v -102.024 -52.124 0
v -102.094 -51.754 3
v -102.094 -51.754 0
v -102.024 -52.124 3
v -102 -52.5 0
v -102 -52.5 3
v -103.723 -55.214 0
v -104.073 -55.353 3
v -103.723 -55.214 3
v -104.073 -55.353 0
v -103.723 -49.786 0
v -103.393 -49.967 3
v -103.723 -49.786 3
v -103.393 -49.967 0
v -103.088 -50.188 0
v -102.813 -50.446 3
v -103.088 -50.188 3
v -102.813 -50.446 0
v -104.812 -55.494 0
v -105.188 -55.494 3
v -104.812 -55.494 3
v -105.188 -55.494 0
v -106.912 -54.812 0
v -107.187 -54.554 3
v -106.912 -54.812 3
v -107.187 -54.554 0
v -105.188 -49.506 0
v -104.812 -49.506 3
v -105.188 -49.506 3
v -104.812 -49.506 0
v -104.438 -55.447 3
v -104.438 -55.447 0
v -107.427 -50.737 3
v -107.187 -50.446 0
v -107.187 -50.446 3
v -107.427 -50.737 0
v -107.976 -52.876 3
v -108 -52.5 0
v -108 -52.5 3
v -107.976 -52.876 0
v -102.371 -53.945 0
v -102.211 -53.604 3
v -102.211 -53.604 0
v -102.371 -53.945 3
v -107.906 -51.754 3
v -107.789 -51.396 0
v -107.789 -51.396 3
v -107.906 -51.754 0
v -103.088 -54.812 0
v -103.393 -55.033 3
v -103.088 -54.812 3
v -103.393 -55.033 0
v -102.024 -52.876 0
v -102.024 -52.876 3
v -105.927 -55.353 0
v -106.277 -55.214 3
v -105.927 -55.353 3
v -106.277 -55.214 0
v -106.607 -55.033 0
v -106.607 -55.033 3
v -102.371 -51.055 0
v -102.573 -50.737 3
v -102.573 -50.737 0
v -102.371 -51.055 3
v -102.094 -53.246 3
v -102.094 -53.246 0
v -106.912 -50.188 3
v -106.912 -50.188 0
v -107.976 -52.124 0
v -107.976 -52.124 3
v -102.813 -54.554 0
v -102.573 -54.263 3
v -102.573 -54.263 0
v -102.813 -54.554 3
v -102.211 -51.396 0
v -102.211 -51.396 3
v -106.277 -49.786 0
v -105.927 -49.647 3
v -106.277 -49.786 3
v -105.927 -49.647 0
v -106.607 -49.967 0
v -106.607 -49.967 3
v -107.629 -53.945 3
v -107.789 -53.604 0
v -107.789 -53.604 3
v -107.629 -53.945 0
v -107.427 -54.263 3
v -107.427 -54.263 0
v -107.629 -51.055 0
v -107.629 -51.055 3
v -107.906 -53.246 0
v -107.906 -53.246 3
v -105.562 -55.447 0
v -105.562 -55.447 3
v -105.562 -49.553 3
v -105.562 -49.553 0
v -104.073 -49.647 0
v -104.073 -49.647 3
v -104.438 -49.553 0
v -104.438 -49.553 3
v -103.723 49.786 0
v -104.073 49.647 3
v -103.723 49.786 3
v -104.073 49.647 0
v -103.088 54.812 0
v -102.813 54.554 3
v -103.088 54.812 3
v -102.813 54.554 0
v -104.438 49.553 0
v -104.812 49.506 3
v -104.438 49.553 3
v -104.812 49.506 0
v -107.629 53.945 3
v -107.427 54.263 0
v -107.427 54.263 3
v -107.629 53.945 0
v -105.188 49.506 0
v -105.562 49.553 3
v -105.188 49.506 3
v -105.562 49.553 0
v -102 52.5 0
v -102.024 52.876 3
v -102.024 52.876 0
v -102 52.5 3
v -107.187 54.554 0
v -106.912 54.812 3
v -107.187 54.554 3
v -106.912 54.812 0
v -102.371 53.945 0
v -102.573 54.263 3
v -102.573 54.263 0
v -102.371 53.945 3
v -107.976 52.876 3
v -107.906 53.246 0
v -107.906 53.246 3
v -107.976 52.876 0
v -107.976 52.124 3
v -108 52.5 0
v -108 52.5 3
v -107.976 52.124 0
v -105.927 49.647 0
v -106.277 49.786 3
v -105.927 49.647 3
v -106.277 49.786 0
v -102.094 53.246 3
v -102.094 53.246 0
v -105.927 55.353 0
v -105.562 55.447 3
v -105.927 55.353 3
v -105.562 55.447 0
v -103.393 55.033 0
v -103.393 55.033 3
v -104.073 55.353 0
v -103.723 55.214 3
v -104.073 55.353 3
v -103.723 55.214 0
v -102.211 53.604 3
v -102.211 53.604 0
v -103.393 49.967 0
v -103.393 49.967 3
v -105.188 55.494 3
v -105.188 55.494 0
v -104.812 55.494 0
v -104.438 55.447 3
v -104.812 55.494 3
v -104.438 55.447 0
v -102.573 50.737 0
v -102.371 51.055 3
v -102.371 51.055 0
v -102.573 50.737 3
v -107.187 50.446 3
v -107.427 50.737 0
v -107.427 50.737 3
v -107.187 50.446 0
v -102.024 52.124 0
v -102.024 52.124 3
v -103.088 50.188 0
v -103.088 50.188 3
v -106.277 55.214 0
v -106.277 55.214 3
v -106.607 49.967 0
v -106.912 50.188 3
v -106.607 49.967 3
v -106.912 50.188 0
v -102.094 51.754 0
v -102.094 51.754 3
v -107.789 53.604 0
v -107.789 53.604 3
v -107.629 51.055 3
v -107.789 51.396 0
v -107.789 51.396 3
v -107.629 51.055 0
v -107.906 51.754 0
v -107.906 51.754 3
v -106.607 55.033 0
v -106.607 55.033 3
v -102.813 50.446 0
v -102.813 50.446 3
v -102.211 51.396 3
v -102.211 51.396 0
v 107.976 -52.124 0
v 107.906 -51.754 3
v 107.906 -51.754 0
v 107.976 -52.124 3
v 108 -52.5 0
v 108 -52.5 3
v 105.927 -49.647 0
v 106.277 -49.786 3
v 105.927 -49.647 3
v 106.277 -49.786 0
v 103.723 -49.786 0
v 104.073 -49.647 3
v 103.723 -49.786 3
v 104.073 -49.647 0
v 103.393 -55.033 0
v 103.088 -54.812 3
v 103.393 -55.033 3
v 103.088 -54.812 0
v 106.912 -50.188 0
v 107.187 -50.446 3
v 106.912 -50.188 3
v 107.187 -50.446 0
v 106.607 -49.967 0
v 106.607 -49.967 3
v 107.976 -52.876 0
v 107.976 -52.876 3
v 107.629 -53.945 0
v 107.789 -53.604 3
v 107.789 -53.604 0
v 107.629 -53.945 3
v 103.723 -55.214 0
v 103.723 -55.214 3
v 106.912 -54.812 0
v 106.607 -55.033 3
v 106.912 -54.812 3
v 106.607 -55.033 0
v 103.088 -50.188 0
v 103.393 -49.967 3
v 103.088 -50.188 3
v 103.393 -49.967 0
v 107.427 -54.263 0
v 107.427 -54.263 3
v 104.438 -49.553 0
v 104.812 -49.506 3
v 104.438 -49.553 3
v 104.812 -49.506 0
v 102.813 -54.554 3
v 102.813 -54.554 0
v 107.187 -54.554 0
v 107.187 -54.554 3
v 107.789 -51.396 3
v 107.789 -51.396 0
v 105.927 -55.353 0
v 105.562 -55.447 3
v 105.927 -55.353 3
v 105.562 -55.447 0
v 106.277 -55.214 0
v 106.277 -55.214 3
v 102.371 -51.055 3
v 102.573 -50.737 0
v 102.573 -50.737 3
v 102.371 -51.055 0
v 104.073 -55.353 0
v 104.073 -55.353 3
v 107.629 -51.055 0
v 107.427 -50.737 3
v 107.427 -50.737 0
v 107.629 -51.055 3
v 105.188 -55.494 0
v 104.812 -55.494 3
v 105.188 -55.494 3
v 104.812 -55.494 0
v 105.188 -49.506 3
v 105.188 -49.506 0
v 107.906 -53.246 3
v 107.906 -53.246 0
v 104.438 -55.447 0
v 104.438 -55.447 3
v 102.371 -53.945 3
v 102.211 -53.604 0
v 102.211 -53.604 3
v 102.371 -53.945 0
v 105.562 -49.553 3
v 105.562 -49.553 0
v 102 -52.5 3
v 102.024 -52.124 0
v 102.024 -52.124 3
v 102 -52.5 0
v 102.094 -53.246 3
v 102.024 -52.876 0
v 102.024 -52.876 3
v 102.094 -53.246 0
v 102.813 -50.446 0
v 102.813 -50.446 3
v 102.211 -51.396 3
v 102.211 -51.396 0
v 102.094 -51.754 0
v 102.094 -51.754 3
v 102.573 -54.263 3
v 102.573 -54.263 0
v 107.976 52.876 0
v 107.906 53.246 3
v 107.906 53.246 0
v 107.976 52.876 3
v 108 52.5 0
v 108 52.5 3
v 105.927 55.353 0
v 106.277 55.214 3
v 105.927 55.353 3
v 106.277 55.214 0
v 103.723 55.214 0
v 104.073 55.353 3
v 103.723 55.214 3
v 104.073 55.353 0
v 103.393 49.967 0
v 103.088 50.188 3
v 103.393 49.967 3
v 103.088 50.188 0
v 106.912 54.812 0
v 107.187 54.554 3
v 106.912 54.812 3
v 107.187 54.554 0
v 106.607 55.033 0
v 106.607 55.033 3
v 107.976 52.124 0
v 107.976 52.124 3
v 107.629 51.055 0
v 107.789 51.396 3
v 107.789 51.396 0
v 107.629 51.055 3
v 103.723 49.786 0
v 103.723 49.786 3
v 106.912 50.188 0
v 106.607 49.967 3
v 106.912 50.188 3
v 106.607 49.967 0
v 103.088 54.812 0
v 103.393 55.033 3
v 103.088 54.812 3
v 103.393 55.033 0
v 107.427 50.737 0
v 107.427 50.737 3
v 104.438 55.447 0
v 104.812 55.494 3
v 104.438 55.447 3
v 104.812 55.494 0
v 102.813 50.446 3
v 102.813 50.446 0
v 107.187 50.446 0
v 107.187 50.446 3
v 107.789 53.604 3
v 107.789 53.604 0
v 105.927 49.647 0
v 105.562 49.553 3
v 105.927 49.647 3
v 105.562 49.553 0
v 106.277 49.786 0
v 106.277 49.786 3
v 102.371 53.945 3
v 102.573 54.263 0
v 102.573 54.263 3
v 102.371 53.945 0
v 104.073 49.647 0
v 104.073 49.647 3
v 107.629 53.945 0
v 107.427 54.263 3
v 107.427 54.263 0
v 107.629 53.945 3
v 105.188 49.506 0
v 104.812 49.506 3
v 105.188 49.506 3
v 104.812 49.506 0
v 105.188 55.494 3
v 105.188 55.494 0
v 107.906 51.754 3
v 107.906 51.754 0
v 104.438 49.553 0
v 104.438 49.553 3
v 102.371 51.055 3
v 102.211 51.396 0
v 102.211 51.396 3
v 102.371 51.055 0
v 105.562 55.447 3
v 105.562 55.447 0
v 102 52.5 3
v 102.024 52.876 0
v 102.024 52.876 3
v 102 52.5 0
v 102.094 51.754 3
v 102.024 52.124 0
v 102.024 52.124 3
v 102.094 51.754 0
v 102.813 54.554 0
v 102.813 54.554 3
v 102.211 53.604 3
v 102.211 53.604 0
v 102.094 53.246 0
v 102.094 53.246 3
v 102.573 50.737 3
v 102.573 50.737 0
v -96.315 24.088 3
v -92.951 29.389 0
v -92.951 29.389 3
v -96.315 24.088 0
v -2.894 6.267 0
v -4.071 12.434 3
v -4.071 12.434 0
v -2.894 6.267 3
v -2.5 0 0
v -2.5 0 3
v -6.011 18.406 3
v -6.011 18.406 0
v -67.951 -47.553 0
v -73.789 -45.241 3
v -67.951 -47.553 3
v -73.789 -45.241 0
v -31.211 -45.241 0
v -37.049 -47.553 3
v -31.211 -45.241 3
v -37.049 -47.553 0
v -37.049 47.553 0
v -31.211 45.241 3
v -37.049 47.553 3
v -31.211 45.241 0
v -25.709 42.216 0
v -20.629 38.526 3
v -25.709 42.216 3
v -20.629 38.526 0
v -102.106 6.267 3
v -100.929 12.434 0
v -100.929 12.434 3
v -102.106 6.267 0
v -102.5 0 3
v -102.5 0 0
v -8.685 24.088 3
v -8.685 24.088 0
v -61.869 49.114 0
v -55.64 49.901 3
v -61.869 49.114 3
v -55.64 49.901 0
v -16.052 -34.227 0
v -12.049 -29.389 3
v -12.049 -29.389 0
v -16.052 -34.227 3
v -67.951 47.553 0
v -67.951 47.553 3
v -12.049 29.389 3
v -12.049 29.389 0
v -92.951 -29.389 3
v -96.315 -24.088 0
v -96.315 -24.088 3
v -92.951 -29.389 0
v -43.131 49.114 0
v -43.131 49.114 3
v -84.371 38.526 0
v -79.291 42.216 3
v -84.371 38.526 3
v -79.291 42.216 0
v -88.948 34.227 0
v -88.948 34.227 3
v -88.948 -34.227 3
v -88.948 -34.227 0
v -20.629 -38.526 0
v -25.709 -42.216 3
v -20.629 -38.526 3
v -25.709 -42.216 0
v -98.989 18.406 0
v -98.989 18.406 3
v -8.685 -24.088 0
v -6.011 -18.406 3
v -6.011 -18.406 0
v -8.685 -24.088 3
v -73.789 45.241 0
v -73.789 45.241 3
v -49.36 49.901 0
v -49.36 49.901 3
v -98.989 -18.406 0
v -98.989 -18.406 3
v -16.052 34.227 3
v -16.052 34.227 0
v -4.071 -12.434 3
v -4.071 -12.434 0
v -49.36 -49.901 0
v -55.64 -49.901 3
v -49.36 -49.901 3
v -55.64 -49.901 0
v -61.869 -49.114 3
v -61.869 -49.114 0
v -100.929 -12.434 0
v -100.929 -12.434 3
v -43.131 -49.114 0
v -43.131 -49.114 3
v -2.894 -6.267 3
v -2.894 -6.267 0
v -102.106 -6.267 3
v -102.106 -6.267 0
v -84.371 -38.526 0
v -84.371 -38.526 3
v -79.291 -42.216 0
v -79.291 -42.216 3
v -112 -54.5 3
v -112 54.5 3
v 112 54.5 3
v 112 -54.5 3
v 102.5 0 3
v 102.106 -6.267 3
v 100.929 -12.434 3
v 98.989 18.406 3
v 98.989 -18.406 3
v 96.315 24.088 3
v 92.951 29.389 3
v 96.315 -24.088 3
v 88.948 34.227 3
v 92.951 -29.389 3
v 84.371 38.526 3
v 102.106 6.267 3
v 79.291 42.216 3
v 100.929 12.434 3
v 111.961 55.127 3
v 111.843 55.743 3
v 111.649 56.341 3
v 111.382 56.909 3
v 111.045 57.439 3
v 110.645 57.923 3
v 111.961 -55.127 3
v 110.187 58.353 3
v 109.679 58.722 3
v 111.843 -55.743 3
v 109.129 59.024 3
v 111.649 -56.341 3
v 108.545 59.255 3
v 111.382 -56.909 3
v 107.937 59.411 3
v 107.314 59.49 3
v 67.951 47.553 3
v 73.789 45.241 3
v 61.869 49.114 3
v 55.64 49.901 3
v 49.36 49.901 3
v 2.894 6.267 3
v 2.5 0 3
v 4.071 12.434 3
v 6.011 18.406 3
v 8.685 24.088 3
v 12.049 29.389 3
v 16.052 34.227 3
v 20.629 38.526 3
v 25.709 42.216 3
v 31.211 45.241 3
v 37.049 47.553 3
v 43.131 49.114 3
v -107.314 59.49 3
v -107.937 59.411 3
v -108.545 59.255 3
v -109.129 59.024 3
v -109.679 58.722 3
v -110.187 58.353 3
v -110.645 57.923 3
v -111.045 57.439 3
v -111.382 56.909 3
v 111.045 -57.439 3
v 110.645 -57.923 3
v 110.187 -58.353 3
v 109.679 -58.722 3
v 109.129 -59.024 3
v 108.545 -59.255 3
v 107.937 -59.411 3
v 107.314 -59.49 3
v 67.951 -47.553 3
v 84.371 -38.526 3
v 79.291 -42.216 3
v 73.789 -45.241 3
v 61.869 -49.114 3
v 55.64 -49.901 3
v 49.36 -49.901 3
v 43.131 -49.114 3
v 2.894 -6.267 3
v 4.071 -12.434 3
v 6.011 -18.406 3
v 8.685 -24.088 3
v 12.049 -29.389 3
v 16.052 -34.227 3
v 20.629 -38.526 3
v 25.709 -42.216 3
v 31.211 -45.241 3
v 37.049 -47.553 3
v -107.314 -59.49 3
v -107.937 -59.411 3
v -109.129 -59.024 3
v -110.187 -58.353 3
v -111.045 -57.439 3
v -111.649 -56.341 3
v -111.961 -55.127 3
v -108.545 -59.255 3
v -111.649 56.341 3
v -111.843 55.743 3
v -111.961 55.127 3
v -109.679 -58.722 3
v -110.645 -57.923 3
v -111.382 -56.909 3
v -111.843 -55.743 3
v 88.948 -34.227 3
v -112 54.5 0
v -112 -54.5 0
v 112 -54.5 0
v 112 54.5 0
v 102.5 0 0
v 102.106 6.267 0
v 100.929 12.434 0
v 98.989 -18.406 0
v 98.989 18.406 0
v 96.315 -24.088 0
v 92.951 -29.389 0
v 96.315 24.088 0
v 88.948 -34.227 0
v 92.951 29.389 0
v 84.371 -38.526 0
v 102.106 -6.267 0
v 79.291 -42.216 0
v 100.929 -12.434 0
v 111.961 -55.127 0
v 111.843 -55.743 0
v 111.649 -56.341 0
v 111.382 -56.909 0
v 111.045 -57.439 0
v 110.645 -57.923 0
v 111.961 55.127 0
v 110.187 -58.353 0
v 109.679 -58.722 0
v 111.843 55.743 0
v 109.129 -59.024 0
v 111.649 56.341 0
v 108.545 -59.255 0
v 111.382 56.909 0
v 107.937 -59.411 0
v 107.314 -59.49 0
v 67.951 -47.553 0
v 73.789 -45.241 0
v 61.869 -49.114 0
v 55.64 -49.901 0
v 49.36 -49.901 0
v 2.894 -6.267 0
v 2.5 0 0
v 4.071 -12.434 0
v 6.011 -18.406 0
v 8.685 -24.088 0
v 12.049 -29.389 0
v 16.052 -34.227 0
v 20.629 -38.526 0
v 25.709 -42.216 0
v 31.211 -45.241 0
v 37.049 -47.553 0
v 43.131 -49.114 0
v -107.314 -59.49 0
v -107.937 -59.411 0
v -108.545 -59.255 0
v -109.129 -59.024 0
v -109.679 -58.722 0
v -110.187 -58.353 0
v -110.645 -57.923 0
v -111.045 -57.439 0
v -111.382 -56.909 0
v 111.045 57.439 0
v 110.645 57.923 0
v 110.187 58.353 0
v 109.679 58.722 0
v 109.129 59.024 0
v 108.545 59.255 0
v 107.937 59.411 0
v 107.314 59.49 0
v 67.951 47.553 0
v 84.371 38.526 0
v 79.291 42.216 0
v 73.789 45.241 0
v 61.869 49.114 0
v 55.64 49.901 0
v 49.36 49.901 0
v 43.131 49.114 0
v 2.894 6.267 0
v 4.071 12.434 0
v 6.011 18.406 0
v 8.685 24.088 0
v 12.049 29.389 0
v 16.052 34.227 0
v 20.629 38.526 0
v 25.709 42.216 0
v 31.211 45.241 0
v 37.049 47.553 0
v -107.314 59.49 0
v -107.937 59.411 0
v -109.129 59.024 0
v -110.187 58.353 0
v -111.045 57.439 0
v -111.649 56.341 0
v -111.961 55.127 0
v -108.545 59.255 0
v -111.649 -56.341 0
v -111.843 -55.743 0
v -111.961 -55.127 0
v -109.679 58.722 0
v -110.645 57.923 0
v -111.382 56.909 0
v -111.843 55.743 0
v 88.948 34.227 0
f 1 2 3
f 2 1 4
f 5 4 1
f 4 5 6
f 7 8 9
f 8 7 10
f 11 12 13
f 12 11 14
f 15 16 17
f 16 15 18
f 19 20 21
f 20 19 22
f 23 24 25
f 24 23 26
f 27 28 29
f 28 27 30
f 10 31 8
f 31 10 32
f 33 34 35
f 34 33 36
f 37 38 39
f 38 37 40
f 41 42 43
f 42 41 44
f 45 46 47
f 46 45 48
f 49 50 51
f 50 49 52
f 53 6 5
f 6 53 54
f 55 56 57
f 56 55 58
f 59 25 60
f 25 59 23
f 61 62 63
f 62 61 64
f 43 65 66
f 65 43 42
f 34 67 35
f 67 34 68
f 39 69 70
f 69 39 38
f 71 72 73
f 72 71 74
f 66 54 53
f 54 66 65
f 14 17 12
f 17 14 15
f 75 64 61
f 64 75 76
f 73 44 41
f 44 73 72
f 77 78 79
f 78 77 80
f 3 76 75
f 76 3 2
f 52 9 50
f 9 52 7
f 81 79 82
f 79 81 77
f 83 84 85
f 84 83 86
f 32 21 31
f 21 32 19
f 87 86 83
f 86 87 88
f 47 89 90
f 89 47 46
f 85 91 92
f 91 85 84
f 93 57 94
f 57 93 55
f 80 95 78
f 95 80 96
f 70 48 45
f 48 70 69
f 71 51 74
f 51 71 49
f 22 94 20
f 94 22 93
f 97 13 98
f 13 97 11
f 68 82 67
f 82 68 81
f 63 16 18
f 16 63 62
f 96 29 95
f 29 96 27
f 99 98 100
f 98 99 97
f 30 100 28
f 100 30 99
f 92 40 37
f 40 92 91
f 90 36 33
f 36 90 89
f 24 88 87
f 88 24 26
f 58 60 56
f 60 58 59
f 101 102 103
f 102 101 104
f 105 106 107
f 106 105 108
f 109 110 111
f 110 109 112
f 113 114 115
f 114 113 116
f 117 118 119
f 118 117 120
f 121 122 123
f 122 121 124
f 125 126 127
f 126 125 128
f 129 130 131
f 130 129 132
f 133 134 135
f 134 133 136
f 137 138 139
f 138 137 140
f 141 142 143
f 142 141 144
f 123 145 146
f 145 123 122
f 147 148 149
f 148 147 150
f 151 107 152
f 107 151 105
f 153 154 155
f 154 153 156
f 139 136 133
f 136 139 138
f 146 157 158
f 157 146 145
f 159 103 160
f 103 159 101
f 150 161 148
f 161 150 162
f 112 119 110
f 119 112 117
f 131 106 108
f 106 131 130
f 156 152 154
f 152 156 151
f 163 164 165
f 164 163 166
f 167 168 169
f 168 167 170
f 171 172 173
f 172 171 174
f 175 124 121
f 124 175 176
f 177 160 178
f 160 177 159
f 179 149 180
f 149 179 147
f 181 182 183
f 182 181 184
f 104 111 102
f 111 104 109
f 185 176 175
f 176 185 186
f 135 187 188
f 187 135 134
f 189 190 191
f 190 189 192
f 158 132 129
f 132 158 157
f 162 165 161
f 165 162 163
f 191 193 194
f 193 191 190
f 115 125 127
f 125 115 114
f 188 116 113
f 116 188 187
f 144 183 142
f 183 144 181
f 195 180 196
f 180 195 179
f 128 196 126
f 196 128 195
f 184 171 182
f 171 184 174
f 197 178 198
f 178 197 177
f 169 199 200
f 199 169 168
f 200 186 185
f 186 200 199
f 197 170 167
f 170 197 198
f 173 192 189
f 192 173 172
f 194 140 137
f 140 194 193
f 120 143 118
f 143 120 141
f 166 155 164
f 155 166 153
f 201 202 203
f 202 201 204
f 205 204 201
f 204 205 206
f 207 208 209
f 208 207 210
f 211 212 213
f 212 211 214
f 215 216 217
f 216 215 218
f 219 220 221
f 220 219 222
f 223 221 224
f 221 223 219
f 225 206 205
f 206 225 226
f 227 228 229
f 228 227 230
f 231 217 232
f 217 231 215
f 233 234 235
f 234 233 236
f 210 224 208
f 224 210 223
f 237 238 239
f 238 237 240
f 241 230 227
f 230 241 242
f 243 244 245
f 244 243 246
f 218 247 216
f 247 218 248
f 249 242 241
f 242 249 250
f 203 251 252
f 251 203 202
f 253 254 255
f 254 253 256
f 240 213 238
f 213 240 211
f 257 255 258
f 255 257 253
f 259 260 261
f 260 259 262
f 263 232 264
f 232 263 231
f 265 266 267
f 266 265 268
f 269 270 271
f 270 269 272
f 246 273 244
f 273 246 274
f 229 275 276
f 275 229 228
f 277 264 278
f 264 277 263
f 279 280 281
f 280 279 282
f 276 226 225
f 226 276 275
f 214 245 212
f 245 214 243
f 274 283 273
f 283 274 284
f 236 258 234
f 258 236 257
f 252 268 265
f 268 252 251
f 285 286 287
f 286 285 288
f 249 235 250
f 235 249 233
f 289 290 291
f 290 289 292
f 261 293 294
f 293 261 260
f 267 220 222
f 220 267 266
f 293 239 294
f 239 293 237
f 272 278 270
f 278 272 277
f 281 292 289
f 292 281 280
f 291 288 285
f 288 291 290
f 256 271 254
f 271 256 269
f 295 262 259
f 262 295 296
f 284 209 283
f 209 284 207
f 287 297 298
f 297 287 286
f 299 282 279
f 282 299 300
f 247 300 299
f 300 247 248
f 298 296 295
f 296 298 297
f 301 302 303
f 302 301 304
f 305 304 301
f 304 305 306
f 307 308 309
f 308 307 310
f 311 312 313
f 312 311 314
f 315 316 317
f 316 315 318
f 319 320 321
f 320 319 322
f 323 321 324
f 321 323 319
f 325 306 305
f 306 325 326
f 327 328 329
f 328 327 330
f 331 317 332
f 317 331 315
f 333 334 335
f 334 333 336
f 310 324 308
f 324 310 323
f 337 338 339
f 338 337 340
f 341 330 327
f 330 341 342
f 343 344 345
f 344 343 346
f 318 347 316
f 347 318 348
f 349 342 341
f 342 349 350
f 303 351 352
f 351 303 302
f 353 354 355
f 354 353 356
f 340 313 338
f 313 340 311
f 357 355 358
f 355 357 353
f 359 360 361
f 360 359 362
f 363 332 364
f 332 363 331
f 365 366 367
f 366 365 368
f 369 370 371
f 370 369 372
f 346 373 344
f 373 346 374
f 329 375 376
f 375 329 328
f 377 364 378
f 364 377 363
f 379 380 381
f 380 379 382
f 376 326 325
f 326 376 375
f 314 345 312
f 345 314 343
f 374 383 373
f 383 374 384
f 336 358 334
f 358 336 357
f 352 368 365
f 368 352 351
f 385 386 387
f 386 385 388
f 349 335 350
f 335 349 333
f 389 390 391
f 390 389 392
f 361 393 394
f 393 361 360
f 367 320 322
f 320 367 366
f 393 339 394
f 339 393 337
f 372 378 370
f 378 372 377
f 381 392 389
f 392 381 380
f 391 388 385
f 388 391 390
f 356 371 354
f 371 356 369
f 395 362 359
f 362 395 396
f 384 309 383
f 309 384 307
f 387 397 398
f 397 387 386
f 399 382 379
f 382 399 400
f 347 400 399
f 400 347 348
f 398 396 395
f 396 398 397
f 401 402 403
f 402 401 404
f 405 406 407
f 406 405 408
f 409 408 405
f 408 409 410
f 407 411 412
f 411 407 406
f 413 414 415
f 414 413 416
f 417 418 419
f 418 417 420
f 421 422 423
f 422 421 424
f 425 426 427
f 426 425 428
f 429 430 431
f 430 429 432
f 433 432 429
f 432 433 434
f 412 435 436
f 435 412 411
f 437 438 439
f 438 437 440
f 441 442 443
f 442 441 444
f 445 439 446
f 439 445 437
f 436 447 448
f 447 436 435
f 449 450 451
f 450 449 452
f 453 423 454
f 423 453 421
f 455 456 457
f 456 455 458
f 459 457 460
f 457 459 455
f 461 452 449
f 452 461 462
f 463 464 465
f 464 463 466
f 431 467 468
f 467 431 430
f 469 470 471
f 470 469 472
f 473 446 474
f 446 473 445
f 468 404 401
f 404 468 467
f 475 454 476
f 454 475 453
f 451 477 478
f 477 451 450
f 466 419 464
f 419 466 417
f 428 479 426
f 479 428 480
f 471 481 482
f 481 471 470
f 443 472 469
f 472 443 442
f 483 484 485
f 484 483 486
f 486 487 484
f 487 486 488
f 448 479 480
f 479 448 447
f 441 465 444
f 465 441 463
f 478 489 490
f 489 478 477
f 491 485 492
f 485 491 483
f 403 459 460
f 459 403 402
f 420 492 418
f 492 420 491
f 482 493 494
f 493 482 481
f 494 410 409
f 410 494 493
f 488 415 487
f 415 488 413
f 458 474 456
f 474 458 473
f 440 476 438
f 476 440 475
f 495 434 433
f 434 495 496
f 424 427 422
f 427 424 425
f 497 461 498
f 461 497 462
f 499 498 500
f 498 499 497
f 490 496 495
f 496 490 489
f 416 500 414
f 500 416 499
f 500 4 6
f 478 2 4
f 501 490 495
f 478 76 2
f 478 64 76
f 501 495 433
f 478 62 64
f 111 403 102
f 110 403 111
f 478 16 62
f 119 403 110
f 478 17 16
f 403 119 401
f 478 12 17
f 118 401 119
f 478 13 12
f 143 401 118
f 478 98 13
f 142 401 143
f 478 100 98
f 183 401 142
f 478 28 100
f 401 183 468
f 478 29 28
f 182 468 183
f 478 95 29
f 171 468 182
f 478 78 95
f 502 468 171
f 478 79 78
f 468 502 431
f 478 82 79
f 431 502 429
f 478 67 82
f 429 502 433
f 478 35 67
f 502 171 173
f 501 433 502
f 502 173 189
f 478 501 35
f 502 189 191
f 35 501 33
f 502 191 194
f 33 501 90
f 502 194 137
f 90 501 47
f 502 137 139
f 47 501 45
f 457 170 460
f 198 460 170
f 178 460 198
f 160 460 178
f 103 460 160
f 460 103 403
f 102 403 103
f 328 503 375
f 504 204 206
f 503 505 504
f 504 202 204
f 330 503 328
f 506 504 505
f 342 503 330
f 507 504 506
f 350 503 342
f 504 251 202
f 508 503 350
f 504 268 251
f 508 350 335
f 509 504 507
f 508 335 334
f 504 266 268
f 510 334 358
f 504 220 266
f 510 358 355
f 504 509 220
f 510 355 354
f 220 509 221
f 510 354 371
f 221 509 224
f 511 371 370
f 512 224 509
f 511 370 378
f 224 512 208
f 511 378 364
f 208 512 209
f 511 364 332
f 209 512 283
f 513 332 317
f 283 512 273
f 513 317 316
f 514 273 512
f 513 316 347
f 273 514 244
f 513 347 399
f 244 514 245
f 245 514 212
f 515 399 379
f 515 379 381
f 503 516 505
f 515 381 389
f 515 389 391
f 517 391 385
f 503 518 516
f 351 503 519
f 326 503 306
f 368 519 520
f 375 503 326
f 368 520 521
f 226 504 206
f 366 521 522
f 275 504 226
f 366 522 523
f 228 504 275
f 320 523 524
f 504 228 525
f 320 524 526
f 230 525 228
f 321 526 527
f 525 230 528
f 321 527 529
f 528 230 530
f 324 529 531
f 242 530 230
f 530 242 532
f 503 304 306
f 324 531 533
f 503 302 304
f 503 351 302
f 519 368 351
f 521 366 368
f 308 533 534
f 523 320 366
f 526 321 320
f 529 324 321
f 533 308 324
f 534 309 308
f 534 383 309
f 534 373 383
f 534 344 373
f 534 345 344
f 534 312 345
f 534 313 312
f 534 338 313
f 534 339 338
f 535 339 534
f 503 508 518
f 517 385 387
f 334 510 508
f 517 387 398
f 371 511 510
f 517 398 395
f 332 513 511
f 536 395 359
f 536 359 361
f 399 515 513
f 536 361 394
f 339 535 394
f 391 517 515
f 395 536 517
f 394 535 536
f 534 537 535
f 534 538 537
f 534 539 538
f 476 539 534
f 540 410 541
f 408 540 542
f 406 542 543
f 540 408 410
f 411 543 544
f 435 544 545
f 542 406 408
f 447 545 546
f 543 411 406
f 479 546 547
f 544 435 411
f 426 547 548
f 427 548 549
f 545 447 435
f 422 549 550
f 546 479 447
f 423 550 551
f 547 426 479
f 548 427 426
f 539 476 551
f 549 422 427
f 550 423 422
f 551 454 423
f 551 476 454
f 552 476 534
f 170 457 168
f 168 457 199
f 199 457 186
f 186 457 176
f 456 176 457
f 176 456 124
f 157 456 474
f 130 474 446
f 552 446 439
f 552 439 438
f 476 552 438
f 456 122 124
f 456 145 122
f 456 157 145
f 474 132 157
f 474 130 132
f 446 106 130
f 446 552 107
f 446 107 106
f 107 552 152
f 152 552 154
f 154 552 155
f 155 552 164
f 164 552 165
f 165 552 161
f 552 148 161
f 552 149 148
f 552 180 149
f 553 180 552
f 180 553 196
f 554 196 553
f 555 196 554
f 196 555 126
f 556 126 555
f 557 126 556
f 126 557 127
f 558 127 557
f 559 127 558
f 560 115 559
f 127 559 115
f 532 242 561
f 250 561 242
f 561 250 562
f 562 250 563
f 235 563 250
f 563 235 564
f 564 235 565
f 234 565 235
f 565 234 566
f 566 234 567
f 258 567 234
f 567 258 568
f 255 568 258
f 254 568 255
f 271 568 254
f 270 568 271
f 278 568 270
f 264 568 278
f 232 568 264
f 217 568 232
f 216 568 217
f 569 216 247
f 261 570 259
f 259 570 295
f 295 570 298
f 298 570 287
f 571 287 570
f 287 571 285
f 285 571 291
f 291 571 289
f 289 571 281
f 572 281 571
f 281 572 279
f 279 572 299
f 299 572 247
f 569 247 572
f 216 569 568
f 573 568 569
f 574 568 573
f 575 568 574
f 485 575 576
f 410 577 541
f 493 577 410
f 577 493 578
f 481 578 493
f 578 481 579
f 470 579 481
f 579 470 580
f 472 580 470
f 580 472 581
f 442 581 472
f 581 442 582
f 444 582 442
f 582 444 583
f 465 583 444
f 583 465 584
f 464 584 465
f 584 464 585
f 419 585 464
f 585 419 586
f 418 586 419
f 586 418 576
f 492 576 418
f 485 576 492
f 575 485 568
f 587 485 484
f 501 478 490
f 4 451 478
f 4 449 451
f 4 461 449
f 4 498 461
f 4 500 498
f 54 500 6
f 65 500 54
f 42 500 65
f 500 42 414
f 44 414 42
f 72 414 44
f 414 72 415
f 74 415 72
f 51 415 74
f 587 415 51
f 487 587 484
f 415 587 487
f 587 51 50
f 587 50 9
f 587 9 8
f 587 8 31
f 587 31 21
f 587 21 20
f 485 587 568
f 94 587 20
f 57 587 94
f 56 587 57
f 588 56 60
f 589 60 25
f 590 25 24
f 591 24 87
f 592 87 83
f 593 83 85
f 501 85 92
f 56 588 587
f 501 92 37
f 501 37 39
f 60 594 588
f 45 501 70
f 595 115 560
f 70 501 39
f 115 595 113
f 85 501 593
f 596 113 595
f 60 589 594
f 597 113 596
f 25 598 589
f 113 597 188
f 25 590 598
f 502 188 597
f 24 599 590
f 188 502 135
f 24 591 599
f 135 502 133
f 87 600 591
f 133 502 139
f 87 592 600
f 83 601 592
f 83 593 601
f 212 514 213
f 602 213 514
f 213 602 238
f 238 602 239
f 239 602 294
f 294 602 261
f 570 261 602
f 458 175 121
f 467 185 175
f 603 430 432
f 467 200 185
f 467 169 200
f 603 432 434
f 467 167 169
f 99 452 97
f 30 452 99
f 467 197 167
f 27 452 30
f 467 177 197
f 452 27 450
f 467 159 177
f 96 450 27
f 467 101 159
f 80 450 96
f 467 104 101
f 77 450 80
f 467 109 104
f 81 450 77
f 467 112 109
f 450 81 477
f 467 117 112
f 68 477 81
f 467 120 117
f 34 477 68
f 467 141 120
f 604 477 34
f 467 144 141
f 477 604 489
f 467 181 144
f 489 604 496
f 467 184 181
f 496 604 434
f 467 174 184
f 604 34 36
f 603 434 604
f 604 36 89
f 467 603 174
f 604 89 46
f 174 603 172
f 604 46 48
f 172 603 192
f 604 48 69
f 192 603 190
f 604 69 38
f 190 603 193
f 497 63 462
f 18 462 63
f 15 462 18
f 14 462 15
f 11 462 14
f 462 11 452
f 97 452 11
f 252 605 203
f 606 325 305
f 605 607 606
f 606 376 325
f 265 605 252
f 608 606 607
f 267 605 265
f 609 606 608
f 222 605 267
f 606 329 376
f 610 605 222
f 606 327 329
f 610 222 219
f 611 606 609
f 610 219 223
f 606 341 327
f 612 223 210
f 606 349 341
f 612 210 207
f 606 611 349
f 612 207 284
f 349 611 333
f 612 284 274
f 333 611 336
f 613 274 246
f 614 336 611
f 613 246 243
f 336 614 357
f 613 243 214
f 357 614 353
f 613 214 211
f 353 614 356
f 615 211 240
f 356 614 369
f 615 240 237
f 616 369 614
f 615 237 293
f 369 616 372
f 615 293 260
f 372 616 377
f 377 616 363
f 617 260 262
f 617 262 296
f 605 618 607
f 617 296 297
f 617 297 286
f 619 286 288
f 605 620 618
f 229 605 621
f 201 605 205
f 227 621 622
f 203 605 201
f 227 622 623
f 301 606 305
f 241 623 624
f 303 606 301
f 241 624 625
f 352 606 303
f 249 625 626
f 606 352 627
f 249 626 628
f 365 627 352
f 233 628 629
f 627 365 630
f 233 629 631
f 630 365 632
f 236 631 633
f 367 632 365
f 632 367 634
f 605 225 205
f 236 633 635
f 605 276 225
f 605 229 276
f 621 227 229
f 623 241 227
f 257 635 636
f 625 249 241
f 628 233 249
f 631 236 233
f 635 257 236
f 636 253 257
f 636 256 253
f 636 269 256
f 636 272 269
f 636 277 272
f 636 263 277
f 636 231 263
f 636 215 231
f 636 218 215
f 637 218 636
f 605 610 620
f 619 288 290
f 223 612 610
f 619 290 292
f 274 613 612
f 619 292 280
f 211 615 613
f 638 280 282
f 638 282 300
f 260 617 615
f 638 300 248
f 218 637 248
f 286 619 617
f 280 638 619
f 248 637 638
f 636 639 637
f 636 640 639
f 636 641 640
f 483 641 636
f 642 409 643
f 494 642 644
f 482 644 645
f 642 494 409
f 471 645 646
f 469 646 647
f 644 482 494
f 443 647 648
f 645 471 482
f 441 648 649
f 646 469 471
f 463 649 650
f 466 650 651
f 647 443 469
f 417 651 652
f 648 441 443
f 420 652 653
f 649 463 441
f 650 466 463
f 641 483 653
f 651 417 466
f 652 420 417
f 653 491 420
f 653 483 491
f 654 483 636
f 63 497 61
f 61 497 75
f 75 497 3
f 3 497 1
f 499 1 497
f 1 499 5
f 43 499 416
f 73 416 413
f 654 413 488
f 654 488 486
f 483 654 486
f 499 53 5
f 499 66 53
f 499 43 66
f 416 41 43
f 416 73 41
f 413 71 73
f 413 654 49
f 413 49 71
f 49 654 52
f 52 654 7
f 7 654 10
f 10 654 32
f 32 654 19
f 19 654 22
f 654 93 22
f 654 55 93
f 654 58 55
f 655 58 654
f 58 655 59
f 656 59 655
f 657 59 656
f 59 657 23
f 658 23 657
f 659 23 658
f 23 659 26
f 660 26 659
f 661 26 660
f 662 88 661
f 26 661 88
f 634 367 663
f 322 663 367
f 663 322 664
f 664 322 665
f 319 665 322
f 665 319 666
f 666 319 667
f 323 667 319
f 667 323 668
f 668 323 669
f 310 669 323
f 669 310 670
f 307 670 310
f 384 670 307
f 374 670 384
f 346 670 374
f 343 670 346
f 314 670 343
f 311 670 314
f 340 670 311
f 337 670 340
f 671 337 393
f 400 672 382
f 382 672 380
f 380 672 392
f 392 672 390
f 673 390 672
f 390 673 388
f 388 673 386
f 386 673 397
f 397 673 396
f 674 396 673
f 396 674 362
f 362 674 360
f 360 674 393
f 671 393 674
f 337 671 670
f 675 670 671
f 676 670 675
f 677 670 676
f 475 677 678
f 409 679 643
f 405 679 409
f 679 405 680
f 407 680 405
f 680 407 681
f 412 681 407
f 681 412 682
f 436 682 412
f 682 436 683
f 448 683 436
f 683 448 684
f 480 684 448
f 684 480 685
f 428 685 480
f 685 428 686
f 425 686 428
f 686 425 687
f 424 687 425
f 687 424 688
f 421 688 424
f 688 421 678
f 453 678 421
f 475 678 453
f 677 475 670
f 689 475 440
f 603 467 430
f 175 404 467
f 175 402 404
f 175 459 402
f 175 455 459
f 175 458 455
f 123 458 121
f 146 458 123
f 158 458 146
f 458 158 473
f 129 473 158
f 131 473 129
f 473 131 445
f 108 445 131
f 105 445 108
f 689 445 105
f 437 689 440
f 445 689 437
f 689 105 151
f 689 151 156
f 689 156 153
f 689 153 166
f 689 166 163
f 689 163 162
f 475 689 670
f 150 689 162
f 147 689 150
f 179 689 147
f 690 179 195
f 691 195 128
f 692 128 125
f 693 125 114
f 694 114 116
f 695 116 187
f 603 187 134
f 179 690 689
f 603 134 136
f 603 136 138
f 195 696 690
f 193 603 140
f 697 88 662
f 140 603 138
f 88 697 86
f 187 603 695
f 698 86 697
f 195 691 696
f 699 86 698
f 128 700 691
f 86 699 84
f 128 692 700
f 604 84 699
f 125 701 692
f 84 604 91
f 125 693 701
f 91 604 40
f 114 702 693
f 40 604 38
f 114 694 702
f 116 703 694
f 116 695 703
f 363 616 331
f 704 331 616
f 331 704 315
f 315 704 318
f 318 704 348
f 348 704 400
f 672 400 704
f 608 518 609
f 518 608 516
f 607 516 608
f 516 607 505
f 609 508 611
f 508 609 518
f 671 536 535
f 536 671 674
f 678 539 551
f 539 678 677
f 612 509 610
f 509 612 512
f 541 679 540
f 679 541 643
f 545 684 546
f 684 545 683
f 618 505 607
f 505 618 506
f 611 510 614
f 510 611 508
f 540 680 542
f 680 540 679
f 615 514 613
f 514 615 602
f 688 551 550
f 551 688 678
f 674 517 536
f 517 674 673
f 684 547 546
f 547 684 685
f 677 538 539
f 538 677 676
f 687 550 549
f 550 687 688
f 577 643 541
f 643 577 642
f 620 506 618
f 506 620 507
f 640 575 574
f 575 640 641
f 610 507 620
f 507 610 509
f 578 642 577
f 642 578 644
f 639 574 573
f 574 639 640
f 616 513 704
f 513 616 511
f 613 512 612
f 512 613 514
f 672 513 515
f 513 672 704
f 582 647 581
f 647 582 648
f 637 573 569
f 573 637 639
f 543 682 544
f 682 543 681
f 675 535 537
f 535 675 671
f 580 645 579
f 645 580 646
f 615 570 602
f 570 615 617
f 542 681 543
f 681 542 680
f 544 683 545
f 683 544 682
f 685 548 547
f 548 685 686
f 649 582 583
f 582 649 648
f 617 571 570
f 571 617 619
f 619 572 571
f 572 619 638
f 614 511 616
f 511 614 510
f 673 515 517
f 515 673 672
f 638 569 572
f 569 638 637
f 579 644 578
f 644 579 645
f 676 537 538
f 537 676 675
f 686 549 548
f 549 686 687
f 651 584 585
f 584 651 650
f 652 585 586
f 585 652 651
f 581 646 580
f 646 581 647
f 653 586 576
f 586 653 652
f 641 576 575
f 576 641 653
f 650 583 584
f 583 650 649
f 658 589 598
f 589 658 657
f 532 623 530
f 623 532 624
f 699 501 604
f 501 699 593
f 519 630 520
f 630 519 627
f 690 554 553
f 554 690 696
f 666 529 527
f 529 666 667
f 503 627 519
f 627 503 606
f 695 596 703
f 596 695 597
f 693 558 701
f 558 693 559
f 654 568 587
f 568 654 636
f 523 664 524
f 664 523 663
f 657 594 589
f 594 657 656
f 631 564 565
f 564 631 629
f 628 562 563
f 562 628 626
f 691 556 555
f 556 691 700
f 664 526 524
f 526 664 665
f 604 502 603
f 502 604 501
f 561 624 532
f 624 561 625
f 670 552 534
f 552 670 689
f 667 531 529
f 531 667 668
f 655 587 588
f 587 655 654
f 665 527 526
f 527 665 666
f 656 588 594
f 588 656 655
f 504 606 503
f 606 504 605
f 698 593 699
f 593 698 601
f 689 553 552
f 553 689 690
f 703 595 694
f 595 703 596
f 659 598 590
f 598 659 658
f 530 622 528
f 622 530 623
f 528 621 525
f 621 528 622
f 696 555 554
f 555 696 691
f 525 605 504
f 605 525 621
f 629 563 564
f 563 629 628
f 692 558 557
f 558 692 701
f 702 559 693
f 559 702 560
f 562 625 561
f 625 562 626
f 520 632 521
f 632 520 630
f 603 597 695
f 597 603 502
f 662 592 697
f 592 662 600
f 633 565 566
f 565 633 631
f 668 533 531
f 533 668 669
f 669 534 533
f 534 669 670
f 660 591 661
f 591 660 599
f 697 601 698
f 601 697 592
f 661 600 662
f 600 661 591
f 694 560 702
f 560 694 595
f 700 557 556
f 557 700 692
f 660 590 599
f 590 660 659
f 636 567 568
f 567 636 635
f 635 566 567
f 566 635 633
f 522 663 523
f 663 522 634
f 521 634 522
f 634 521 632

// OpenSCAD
$fn = 50;


difference() {
	union() {
		hull() {
			translate(v = [-107.0000000000, 54.5000000000, 0]) {
				cylinder(h = 3, r = 5);
			}
			translate(v = [107.0000000000, 54.5000000000, 0]) {
				cylinder(h = 3, r = 5);
			}
			translate(v = [-107.0000000000, -54.5000000000, 0]) {
				cylinder(h = 3, r = 5);
			}
			translate(v = [107.0000000000, -54.5000000000, 0]) {
				cylinder(h = 3, r = 5);
			}
		}
	}
	union() {
		#translate(v = [-105.0000000000, -52.5000000000, -100.0000000000]) {
			cylinder(h = 200, r = 3.0000000000);
		}
		#translate(v = [-105.0000000000, 52.5000000000, -100.0000000000]) {
			cylinder(h = 200, r = 3.0000000000);
		}
		#translate(v = [105.0000000000, -52.5000000000, -100.0000000000]) {
			cylinder(h = 200, r = 3.0000000000);
		}
		#translate(v = [105.0000000000, 52.5000000000, -100.0000000000]) {
			cylinder(h = 200, r = 3.0000000000);
		}
		#translate(v = [-52.5000000000, 0, 0]) {
			cylinder(h = 3, r = 50.0000000000);
		}
		#translate(v = [52.5000000000, 0, 0]) {
			cylinder(h = 3, r = 50.0000000000);
		}
	}
}
